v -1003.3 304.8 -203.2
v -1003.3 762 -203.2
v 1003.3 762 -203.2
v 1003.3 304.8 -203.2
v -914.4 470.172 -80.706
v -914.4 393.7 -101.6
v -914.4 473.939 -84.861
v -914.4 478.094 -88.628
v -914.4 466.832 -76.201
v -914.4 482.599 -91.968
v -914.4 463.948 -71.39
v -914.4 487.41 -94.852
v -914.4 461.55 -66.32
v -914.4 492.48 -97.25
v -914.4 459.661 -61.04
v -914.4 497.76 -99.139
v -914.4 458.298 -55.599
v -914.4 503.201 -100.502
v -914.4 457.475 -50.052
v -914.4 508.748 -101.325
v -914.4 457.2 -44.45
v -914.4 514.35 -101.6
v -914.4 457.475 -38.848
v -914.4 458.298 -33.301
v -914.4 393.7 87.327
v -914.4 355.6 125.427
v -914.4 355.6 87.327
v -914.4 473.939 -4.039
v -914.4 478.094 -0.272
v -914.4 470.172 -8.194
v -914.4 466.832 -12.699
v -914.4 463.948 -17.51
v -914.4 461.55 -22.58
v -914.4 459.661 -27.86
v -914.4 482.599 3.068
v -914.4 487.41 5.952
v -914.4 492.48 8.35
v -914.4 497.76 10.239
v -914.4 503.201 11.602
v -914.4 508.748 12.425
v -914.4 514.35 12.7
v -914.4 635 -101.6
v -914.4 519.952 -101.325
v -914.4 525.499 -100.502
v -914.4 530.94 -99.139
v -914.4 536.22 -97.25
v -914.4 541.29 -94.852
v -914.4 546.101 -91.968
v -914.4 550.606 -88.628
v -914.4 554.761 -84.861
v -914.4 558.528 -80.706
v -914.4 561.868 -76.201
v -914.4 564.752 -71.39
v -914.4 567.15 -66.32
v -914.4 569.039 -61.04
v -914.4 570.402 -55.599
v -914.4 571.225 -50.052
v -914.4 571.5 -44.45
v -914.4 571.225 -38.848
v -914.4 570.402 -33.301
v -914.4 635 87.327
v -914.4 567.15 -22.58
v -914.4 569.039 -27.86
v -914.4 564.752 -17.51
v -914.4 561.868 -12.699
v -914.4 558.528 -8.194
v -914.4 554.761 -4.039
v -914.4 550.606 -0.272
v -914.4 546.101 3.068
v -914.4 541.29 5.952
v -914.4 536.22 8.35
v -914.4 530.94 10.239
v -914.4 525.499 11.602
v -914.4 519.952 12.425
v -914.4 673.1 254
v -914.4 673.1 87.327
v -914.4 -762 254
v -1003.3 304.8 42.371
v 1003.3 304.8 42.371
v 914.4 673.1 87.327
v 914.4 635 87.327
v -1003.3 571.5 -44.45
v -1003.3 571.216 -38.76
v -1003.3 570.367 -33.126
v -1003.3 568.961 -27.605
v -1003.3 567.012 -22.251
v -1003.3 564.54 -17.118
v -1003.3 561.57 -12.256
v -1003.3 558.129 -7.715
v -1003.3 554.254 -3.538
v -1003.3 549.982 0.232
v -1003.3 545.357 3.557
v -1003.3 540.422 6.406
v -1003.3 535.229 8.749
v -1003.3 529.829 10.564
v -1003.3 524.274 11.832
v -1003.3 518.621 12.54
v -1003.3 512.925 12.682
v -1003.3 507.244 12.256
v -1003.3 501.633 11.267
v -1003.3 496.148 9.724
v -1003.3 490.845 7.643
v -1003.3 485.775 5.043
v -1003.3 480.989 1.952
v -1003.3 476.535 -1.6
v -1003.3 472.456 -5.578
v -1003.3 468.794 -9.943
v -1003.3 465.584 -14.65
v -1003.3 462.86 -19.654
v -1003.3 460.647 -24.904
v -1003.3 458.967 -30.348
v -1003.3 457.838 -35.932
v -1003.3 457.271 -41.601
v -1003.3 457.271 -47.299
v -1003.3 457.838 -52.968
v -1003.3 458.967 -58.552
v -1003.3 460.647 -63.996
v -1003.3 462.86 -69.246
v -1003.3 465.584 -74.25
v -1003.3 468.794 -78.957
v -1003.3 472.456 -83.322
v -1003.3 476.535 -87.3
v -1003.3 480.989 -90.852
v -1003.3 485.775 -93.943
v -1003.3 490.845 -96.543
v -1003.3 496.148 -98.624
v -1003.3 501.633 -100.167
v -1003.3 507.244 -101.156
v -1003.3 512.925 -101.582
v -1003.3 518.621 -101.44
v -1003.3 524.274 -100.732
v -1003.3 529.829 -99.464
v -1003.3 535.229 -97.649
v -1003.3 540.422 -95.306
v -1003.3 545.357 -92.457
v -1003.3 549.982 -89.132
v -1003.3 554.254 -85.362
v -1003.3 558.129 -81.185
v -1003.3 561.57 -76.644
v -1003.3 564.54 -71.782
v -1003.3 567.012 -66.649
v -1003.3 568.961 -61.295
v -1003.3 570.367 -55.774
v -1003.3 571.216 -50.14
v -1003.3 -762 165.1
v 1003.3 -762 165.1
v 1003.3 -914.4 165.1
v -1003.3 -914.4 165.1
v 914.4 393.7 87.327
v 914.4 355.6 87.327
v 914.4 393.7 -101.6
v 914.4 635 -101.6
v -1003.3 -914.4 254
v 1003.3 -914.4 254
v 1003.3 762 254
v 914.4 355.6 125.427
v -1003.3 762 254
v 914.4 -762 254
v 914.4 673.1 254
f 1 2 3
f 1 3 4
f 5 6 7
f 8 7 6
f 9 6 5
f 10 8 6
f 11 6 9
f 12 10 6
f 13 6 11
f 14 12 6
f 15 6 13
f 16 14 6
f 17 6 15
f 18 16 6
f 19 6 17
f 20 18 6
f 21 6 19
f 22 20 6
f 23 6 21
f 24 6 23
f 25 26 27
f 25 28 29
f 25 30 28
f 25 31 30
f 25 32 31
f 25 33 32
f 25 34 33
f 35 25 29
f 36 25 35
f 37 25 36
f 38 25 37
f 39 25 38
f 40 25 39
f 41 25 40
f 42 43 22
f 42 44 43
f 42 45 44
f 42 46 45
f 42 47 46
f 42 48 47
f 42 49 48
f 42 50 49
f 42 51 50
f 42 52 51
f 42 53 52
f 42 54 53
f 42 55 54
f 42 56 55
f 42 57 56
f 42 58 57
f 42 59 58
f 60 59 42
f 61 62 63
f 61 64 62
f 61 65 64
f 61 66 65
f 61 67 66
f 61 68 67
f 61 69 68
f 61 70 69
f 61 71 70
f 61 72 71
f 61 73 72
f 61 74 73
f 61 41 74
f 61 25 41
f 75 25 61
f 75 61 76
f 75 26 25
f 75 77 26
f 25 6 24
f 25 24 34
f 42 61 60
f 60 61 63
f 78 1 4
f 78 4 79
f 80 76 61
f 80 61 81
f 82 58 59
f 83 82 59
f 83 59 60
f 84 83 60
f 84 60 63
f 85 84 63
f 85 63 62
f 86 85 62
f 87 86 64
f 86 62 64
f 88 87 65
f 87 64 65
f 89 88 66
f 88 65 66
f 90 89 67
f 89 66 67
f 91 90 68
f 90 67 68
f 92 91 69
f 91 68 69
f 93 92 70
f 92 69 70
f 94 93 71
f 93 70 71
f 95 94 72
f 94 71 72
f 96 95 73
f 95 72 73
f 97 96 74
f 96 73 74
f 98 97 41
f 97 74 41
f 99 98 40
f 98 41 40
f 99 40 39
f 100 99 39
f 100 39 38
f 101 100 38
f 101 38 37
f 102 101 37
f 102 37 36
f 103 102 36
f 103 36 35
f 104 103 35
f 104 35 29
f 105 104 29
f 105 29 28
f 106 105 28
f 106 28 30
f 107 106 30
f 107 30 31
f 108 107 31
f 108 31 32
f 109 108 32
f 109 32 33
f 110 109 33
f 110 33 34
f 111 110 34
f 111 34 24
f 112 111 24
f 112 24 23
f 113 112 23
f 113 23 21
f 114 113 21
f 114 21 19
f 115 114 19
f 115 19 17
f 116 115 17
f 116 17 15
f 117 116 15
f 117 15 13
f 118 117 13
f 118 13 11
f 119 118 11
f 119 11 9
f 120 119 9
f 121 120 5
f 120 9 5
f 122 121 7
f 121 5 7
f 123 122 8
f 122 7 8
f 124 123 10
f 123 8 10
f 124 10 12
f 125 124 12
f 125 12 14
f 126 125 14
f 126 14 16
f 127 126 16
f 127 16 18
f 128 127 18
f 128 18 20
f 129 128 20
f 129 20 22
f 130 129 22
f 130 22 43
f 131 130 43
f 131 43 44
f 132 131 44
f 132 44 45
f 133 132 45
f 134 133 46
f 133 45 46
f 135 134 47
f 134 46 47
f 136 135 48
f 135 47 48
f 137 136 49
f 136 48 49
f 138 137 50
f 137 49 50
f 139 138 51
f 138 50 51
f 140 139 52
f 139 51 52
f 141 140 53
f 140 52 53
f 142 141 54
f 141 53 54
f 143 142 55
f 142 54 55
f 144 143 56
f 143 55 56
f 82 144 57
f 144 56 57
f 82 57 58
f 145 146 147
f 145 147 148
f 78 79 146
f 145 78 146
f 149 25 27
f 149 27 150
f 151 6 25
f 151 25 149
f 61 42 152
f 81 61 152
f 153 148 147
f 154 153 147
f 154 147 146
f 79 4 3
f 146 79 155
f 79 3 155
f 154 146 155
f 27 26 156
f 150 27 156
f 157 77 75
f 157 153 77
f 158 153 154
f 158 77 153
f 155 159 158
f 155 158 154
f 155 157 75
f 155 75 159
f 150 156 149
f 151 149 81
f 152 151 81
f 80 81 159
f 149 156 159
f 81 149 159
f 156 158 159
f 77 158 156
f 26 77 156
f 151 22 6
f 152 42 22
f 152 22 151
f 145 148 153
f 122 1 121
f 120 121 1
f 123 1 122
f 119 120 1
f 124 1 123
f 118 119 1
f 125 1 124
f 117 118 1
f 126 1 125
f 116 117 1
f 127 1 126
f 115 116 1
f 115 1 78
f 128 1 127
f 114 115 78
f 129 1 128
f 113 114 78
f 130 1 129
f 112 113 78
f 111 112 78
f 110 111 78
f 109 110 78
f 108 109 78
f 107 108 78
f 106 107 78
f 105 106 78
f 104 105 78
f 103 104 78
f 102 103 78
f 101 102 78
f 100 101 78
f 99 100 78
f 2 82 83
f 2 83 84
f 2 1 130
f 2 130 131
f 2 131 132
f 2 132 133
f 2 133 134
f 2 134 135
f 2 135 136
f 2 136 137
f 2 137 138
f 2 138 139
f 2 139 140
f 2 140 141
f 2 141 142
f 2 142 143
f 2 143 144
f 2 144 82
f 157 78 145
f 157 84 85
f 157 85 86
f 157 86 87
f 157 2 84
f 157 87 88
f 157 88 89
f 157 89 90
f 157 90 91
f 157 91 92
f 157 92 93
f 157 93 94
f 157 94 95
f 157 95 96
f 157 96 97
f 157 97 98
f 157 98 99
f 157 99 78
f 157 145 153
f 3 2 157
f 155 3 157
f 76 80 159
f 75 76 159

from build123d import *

# Parameters (mm, degrees)
F0_W          = 2006.6
F0_H          = 1524
F1_DEPTH      = 254
F4_DEPTH      = 914.4
F5_DEPTH      = 88.901
F6_DEPTH      = 88.901
F3_W          = 457.2
F3_H          = 457.2
F7_DEPTH      = 2006.6
F8_DEPTH      = 914.4
F8_DEPTH_BACK = 914.4
F9_W          = 1828.8
F9_H          = 317.5
F10_DEPTH     = 355.6
F11_W         = 1828.8
F11_H         = 38.1
F12_DEPTH     = 188.9265486726
F13_R         = 57.15
F14_DEPTH     = 88.901
F15_DEPTH     = 152.4


with BuildPart() as f1:
    # F0 (on Top) → F1 (new body)
    with BuildSketch(Plane.XY):
        Rectangle(F0_W, F0_H)
    extrude(amount=F1_DEPTH)

    # F2 (on Right) → F4 (cut, symmetric)
    with BuildSketch(Plane.YZ):
        Polygon((673.1, 254), (-762, 254), (673.1, 88.9), align=None)
        Polygon((673.1, 0), (-762, 165.1), (-762, 0), align=None)
    extrude(amount=F4_DEPTH, both=True, mode=Mode.SUBTRACT)

    # F5 (cut, through all): a face of the model
    f5_faces = [f1.faces().sort_by_distance(p)[0] for p in [
        (-914.4, -283.6333333333, 55.0333333333),
    ]]
    extrude(f5_faces, amount=-F5_DEPTH, mode=Mode.SUBTRACT)

    # F6 (cut, through all): a face of the model
    f6_faces = [f1.faces().sort_by_distance(p)[0] for p in [
        (914.4, -283.6333333333, 55.0333333333),
    ]]
    extrude(f6_faces, amount=-F6_DEPTH, mode=Mode.SUBTRACT)

    # F3 (on face) → F7 (join, through all)
    with BuildSketch(Plane(origin=(-1003.3, 0, 0), x_dir=(0, -1, 0), z_dir=(-1, 0, 0))):
        with Locations((-533.4, 25.4)):
            Rectangle(F3_W, F3_H)
    extrude(amount=-F7_DEPTH)

    # F2 (on Right) → F8 (cut, two sides)
    with BuildSketch(Plane.YZ) as f8_sk:
        Polygon((673.1, 254), (-762, 254), (673.1, 88.9), align=None)
    extrude(amount=-F8_DEPTH, mode=Mode.SUBTRACT)
    extrude(f8_sk.sketch, amount=F8_DEPTH_BACK, mode=Mode.SUBTRACT)

    # F9 (on face) → F10 (cut, through all)
    with BuildSketch(Plane.XY.offset(254)):
        with Locations((0, 514.35)):
            Rectangle(F9_W, F9_H)
    extrude(amount=-F10_DEPTH, mode=Mode.SUBTRACT)

    # F11 (on face) → F12 (join, through all)
    with BuildSketch(Plane.XY.offset(-101.6)):
        with Locations((0, 654.05)):
            Rectangle(F11_W, F11_H)
        with Locations((0, 374.65)):
            Rectangle(F11_W, F11_H)
    extrude(amount=F12_DEPTH)

    # F13 (on face) → F14 (cut, through all)
    with BuildSketch(Plane.YZ.offset(-914.4)):
        with Locations((514.35, -44.45)):
            Circle(F13_R)
    extrude(amount=-F14_DEPTH, mode=Mode.SUBTRACT)

    # F15 (add): a face of the model
    f15_faces = [f1.faces().sort_by_distance(p)[0] for p in [
        (0, -762, 209.55),
    ]]
    extrude(f15_faces, amount=F15_DEPTH)


solid = f1.part
